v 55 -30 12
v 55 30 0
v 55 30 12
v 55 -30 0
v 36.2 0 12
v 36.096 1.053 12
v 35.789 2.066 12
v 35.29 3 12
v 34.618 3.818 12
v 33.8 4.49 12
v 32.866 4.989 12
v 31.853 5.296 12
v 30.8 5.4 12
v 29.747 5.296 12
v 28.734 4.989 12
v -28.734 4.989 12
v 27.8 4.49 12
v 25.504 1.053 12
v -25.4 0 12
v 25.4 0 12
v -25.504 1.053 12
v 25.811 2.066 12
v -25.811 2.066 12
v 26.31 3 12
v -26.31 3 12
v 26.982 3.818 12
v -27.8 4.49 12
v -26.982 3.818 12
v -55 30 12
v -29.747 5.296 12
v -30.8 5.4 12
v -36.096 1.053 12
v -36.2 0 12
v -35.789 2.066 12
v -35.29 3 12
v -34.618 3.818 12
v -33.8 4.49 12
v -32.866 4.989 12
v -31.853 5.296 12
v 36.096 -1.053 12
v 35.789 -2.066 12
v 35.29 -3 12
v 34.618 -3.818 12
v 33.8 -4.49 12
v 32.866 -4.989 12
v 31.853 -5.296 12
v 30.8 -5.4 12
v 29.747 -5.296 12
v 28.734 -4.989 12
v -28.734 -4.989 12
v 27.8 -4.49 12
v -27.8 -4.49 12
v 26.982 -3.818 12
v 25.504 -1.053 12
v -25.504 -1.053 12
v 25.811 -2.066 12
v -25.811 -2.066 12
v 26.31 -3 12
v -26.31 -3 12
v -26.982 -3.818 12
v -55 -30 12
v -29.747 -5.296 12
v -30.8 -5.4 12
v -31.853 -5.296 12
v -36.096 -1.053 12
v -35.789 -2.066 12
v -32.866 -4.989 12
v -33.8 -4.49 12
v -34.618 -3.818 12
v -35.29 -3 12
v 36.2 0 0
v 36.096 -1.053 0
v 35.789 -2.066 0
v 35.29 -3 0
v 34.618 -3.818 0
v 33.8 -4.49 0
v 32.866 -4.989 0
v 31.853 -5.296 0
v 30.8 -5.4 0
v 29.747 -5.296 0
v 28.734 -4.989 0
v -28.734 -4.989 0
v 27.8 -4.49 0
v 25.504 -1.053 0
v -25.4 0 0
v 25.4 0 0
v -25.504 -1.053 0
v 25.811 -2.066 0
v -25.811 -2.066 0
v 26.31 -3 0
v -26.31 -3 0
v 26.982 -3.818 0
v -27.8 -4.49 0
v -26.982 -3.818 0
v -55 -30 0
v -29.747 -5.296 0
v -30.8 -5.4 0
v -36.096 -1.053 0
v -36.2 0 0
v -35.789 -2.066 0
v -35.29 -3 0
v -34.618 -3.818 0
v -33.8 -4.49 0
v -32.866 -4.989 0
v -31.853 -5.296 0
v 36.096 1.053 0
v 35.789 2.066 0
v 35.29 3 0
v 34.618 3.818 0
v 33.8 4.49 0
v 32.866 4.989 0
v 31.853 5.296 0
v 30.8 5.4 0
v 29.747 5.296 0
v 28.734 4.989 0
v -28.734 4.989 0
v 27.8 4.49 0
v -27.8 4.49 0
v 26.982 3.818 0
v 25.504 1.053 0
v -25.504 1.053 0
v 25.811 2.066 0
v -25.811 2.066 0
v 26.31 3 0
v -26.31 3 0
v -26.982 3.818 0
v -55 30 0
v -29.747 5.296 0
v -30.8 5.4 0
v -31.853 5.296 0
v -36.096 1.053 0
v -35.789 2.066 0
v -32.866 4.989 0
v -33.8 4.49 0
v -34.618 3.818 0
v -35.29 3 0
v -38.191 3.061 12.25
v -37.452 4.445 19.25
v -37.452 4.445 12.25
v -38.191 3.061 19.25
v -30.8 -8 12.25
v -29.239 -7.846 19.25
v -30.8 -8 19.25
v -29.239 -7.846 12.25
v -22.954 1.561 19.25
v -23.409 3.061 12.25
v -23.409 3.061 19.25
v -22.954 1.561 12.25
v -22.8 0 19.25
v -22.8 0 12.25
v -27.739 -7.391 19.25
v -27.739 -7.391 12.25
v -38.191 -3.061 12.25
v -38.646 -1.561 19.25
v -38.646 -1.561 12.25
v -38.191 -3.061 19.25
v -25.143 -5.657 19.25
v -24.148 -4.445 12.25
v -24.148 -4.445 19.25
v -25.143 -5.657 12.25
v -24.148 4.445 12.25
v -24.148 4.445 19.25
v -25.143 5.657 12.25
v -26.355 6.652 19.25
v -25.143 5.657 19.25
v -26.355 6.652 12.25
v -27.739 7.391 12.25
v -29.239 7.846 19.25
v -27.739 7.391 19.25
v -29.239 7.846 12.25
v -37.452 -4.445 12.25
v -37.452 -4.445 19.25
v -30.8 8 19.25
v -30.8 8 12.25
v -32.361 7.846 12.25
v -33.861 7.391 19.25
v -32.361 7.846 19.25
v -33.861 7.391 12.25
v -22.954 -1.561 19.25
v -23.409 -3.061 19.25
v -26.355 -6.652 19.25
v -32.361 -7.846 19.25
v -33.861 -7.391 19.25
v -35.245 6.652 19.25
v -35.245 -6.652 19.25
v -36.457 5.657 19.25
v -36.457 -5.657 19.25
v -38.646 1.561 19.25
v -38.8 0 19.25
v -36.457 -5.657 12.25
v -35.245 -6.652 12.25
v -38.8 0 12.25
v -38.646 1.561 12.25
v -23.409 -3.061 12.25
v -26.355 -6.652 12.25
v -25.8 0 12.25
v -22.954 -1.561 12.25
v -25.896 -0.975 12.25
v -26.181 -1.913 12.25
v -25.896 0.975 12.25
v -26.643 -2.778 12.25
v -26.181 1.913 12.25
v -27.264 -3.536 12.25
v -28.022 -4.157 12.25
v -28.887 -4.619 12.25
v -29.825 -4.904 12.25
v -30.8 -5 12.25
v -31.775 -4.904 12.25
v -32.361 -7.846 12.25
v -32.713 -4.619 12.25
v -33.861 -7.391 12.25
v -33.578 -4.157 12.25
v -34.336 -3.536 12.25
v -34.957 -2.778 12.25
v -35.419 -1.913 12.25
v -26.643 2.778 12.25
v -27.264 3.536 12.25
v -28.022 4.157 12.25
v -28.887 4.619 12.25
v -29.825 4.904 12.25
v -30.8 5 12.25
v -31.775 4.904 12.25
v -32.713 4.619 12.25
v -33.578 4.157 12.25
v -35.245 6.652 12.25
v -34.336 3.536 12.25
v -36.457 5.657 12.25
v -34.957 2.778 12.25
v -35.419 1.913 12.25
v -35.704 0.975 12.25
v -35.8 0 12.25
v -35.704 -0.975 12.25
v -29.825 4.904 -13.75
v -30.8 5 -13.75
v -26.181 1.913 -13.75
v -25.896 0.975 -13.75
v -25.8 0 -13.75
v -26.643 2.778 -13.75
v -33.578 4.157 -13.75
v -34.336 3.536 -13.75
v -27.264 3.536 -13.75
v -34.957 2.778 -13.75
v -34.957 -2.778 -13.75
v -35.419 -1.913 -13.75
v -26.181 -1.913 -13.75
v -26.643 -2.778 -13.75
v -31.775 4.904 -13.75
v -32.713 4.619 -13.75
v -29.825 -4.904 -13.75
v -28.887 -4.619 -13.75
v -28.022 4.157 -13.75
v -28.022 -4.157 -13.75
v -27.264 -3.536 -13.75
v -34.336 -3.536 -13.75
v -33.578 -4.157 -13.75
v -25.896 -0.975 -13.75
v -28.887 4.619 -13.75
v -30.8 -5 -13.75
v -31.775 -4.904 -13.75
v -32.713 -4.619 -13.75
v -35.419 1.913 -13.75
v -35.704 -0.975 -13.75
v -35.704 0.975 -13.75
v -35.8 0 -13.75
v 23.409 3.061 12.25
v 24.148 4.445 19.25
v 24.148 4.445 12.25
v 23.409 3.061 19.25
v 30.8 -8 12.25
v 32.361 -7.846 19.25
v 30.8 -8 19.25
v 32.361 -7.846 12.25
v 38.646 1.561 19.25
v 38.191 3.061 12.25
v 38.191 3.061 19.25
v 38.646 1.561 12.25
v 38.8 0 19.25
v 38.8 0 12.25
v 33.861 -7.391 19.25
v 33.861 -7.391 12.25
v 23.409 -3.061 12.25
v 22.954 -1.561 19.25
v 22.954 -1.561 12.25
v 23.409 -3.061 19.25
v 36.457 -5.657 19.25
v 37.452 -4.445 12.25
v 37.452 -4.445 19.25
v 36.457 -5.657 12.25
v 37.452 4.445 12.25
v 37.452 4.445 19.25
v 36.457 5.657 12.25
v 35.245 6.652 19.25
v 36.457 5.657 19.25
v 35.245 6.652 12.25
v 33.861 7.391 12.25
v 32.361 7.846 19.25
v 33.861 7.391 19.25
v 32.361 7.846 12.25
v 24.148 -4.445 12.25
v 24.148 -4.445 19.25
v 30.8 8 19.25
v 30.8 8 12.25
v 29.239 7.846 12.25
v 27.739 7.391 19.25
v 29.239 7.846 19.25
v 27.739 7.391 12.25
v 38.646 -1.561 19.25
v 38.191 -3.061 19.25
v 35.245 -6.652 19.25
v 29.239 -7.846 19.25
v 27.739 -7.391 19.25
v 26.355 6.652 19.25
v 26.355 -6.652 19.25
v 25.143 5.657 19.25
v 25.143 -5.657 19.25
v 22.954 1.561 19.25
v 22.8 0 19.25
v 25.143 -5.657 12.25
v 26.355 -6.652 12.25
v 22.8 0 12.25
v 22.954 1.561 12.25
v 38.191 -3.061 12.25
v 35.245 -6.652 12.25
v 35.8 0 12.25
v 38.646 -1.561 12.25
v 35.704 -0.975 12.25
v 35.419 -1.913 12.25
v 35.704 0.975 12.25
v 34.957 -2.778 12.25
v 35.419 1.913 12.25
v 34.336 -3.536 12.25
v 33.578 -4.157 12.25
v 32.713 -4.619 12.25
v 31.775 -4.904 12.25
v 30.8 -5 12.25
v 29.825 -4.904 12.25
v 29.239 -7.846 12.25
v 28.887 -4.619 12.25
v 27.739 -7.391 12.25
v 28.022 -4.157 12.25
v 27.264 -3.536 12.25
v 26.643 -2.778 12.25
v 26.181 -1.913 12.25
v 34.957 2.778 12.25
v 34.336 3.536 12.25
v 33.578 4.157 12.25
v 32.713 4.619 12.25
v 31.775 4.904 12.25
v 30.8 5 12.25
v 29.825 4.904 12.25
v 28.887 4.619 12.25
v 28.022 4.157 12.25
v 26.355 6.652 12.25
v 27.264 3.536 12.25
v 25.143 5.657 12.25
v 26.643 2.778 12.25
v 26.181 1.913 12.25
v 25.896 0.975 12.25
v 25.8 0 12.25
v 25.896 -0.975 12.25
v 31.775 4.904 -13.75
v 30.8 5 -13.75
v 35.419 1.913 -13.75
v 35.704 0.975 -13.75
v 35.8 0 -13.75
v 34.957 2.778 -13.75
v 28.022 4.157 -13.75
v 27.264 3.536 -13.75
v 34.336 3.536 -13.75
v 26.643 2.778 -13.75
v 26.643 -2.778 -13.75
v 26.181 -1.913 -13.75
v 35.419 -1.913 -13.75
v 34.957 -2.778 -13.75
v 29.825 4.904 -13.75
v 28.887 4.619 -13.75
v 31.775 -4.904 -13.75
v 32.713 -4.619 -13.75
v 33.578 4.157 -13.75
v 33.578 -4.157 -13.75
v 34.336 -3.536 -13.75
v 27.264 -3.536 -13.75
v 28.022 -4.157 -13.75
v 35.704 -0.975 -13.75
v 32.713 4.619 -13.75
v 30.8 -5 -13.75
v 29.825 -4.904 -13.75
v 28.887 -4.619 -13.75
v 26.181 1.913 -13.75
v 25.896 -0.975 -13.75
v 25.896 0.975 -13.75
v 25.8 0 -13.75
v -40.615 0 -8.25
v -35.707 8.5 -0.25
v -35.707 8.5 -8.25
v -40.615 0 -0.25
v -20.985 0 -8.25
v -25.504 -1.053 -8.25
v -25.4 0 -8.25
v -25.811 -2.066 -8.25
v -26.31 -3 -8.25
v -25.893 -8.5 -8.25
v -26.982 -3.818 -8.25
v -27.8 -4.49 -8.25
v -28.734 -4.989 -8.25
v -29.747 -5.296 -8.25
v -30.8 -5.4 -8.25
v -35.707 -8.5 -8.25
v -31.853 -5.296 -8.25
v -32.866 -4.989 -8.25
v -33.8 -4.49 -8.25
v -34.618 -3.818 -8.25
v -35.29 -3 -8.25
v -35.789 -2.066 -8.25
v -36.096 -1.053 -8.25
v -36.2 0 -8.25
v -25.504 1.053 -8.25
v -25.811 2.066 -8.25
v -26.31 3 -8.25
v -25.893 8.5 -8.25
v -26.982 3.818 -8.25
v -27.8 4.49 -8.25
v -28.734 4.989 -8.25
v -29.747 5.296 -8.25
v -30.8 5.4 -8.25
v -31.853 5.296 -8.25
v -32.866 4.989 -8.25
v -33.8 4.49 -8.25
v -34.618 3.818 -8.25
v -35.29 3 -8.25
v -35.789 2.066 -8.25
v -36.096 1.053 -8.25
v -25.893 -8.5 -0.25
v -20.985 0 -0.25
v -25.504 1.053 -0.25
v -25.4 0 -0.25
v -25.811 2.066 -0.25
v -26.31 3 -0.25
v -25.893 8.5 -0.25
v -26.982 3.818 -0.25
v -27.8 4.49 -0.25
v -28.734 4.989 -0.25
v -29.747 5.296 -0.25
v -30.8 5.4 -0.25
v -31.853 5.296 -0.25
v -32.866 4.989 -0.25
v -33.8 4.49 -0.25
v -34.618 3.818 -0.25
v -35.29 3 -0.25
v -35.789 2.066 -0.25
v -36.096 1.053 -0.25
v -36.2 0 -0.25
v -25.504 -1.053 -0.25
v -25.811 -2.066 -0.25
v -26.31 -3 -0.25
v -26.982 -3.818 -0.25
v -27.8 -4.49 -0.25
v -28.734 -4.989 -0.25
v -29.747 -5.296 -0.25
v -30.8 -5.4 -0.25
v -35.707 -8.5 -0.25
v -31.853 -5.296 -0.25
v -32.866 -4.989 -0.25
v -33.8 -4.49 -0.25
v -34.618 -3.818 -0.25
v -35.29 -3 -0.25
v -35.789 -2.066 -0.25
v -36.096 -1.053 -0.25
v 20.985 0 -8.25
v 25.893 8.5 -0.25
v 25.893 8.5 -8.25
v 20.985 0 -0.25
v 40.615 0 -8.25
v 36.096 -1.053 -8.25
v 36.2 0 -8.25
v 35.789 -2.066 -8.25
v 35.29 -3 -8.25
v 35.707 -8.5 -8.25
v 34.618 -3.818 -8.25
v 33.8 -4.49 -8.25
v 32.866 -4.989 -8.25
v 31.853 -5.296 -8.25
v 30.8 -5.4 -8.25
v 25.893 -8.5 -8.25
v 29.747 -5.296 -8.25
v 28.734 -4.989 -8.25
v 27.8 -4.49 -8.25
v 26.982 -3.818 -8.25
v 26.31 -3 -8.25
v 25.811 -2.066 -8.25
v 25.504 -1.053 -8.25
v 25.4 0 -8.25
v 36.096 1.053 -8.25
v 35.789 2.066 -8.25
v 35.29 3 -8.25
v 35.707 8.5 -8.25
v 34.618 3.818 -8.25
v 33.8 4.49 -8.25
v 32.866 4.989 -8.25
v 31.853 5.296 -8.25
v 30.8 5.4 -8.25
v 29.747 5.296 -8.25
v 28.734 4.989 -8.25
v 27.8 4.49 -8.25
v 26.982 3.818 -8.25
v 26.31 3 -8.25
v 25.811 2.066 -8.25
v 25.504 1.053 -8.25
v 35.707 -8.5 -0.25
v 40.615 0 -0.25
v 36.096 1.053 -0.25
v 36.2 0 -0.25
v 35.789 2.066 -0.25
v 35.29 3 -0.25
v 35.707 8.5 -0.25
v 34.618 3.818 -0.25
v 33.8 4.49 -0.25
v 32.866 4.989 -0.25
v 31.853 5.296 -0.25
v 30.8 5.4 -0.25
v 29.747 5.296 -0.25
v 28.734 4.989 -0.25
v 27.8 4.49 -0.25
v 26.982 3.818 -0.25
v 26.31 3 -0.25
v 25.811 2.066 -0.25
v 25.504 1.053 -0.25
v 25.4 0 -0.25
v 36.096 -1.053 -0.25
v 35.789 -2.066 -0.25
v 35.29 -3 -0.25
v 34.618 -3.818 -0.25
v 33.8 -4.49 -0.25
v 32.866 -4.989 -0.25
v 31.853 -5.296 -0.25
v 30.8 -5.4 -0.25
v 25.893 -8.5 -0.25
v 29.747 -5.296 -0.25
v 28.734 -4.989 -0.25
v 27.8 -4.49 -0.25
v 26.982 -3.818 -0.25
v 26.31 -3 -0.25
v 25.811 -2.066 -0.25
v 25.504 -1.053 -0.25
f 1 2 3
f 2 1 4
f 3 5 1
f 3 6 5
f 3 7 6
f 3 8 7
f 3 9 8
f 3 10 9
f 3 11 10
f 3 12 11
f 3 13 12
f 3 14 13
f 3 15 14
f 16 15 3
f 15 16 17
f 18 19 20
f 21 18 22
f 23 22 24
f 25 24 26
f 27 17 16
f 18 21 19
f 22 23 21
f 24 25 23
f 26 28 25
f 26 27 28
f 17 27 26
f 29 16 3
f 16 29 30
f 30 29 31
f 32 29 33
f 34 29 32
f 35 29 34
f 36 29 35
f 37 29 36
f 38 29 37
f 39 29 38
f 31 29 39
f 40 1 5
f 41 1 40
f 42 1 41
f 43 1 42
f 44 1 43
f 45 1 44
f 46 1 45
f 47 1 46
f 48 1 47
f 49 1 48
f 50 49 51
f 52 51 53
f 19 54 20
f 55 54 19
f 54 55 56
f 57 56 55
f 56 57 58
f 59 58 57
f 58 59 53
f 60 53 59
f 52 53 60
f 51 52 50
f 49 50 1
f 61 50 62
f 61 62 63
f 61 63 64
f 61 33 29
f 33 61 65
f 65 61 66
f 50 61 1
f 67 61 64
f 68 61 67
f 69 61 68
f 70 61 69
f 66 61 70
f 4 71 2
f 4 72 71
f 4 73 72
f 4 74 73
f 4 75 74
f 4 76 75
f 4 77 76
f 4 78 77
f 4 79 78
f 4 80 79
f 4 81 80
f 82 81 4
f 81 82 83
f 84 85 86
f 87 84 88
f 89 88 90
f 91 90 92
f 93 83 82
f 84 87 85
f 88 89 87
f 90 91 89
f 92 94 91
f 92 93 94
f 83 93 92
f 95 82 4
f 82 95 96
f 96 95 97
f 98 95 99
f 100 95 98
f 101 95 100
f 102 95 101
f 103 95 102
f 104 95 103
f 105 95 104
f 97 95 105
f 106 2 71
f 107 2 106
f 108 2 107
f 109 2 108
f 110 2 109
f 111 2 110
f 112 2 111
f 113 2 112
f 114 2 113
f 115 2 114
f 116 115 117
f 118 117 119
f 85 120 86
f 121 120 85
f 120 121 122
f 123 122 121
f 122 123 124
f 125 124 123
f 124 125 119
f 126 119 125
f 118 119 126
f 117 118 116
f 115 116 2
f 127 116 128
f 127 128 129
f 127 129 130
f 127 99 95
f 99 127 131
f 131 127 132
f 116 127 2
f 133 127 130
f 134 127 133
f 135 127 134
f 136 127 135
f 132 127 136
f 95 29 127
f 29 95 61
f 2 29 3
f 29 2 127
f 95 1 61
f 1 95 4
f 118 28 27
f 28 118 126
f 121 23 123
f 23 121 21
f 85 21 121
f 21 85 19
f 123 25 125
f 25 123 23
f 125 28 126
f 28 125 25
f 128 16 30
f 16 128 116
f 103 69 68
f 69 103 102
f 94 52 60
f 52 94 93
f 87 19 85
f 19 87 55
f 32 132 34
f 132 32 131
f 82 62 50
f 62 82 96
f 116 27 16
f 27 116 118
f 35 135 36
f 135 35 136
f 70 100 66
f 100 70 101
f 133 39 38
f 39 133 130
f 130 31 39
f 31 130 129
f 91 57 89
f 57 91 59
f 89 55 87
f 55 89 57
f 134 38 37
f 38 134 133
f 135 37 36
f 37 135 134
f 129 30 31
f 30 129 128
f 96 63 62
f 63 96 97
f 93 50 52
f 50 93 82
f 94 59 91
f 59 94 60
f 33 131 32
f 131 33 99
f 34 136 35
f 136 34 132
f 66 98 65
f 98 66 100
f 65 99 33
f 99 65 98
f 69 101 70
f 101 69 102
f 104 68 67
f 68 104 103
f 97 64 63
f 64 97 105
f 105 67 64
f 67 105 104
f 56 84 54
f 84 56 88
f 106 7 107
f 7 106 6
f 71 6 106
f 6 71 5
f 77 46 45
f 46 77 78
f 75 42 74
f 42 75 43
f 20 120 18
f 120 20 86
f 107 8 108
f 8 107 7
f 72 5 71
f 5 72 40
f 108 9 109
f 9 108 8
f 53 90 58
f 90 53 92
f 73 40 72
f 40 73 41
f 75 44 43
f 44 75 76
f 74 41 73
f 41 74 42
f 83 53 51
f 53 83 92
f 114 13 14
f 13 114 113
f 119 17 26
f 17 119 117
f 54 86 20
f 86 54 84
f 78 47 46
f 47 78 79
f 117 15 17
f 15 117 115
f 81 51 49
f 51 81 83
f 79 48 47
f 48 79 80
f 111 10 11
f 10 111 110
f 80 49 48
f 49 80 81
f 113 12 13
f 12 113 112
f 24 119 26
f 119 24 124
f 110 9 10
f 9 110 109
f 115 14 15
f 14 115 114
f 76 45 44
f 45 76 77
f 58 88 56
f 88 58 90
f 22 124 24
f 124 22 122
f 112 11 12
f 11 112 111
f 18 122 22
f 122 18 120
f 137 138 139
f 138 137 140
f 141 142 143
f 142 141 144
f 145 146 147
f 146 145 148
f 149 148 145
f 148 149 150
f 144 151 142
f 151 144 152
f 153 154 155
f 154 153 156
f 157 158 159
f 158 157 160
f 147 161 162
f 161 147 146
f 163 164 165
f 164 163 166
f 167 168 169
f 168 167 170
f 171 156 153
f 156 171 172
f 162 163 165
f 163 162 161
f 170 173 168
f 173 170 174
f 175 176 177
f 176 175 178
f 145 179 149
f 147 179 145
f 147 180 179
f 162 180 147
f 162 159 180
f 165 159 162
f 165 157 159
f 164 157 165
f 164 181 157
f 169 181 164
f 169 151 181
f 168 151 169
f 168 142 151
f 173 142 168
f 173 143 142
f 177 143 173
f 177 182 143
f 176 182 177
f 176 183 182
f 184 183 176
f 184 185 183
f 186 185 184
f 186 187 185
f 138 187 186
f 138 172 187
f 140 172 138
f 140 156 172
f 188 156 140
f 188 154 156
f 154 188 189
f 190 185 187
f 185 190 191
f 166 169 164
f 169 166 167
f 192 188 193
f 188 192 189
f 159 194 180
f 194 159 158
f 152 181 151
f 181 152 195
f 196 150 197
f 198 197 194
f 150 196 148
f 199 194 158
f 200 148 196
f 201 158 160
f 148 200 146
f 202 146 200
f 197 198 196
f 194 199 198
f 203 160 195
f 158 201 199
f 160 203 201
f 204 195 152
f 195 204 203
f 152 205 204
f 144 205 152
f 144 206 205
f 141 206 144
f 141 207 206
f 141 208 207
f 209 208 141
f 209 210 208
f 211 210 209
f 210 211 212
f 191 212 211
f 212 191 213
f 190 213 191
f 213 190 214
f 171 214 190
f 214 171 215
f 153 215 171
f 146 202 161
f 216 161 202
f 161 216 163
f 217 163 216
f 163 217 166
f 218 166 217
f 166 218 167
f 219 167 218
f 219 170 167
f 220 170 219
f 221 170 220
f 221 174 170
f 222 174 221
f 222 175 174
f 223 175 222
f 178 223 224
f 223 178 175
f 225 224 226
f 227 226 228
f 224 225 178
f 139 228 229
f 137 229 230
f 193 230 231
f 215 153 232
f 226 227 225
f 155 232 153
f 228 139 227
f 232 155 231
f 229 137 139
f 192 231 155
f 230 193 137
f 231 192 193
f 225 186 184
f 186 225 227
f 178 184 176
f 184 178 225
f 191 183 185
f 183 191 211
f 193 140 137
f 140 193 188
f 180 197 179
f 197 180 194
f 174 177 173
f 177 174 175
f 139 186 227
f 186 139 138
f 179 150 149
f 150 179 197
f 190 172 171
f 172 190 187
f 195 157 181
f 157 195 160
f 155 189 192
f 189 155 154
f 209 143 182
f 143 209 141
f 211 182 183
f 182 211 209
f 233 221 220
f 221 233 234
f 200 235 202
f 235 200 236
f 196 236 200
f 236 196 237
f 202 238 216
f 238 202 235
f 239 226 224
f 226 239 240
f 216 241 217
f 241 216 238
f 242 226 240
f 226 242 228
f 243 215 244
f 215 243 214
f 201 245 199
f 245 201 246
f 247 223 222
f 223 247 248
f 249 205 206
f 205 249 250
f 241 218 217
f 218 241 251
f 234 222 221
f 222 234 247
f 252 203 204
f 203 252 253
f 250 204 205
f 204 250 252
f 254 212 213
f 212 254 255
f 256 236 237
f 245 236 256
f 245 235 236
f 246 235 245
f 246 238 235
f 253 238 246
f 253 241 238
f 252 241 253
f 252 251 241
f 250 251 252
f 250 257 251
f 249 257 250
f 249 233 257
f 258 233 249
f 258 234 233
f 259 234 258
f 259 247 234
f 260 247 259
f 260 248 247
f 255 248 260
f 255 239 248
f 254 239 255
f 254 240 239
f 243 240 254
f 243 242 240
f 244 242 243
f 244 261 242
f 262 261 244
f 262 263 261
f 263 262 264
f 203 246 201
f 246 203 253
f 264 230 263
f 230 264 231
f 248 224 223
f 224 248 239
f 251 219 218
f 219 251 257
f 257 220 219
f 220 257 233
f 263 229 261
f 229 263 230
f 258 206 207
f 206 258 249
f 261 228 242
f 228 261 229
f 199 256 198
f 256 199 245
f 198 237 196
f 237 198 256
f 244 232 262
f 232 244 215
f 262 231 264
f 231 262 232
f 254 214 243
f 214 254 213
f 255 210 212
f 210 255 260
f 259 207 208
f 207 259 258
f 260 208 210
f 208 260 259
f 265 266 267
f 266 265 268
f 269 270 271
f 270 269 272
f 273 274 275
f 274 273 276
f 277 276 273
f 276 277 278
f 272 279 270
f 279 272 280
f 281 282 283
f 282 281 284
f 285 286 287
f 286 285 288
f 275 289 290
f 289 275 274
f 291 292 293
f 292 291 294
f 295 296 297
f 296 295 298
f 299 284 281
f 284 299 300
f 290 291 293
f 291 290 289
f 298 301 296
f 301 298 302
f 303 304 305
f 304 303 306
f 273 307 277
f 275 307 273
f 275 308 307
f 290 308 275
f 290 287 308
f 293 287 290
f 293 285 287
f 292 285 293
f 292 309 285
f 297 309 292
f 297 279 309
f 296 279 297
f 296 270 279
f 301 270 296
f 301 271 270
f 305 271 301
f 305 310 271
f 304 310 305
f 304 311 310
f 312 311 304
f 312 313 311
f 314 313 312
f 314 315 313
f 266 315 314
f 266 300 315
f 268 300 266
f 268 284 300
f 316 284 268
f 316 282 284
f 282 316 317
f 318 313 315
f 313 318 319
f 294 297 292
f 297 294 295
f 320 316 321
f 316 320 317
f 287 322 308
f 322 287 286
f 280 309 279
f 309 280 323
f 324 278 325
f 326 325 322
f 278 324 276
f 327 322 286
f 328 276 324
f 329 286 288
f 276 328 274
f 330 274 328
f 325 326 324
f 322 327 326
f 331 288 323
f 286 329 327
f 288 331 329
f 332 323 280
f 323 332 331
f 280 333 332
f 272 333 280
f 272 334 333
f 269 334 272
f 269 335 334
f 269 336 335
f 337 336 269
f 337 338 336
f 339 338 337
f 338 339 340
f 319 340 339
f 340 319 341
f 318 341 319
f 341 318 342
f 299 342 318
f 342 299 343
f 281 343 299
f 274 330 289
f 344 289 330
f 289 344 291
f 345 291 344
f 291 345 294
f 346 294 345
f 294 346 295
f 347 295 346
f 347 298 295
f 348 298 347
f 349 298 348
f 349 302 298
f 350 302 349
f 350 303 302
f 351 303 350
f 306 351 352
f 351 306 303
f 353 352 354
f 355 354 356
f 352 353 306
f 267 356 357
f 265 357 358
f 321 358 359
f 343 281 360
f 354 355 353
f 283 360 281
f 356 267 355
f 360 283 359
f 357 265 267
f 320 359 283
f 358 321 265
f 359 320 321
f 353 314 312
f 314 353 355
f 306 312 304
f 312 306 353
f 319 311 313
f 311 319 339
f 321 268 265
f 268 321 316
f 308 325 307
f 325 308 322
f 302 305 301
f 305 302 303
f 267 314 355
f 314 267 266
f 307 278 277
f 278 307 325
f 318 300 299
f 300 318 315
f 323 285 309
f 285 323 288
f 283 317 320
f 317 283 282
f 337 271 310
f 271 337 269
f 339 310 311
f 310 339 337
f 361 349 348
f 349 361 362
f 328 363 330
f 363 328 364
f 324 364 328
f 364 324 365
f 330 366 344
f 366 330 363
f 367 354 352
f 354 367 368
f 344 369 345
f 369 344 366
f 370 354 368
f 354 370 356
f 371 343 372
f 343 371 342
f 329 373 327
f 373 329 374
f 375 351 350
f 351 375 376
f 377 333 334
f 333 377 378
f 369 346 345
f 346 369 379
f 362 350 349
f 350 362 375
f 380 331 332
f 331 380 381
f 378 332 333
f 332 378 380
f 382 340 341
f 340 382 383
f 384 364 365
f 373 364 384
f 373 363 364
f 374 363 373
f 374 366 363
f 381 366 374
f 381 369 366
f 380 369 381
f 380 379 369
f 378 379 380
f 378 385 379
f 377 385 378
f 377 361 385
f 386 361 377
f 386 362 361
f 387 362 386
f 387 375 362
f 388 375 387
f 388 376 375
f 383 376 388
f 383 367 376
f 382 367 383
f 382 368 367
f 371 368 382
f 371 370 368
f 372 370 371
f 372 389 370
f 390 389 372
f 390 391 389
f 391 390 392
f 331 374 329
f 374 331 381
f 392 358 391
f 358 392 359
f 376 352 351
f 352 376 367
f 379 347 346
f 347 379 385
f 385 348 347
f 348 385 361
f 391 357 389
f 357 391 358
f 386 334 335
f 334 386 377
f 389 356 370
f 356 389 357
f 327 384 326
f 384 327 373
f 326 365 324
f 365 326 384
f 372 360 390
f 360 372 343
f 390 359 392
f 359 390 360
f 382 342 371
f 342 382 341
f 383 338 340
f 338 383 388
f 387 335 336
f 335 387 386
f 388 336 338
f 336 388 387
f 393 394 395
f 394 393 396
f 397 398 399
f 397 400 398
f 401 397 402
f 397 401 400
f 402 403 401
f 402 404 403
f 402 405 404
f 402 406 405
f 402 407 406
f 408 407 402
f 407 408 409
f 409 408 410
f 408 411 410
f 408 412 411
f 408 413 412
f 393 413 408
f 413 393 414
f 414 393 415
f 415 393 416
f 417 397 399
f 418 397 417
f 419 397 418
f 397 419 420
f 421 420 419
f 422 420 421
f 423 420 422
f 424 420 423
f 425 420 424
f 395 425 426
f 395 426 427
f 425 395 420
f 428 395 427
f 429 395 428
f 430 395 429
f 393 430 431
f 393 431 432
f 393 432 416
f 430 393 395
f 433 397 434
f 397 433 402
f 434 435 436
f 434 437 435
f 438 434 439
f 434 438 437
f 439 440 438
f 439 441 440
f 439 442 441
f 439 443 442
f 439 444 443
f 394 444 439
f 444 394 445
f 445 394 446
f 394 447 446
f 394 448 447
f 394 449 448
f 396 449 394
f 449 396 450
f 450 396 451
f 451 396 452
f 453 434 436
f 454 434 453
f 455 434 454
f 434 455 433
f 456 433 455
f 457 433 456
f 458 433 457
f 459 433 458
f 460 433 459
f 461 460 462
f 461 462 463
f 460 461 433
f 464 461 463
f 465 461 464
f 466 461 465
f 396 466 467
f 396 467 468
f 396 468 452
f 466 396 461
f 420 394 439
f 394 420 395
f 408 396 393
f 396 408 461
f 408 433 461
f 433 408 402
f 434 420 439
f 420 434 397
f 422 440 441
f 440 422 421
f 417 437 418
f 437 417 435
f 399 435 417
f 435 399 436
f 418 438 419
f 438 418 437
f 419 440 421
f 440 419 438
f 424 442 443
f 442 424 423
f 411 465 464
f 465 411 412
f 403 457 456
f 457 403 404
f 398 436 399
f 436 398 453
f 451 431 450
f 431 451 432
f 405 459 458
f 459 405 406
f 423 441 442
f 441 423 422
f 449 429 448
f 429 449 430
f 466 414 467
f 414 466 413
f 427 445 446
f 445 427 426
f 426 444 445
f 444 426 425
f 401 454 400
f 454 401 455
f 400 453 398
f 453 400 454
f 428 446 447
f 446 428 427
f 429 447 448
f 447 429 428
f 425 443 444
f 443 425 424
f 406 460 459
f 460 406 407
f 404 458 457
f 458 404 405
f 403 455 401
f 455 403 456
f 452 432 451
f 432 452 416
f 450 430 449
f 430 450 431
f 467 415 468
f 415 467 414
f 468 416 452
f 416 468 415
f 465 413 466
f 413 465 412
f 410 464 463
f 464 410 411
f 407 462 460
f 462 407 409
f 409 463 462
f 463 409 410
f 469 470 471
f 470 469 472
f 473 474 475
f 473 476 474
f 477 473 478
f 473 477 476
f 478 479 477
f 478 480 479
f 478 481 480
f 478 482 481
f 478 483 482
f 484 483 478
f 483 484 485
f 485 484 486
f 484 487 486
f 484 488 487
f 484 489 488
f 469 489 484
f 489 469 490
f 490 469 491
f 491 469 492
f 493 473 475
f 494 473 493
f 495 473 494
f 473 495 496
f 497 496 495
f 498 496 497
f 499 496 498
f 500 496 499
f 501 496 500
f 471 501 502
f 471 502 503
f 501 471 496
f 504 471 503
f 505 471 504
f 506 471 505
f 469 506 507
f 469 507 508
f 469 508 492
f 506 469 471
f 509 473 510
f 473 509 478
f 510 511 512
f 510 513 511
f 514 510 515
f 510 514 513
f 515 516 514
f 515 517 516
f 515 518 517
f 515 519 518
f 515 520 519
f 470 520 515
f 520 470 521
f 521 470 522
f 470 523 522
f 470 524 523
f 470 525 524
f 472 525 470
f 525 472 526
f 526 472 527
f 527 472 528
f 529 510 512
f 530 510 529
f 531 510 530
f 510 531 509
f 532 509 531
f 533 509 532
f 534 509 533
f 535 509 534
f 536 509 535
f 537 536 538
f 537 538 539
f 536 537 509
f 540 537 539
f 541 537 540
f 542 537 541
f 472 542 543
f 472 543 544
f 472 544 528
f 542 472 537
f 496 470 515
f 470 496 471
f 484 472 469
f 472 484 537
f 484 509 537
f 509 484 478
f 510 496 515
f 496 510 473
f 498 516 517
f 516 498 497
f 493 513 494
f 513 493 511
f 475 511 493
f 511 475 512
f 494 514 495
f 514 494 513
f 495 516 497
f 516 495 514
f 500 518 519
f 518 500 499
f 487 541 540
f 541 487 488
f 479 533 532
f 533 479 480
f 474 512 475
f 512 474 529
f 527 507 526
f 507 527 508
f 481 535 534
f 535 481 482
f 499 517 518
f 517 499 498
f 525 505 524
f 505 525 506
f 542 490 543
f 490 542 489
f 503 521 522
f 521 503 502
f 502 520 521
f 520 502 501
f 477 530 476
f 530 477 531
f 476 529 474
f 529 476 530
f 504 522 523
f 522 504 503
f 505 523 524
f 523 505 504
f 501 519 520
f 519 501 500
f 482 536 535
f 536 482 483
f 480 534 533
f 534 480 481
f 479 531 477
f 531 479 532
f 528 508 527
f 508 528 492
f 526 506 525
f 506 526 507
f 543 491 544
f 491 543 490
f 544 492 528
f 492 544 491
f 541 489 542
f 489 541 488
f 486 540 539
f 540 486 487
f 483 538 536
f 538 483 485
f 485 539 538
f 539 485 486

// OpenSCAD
$fn = 32;

// ------------------------------------------------------------------------
// Bolted plate: 110 x 60 x 12 mm plate, 2 fasteners
// Every part is its own module, assembly() places them once.
// ------------------------------------------------------------------------

// --- part 1 ---
module plate() {
  difference() {
    translate([-55, -30, 0]) cube([110, 60, 12]);
    translate([-30.8, 0, -1]) cylinder(h = 14, d = 10.8);
    translate([30.8, 0, -1]) cylinder(h = 14, d = 10.8);
  }
}

// --- part 2 ---
module bolt1() {
  cylinder(h = 7, d = 16);
  translate([0, 0, -26]) cylinder(h = 26, d = 10);
}

// --- part 3 ---
module bolt2() {
  cylinder(h = 7, d = 16);
  translate([0, 0, -26]) cylinder(h = 26, d = 10);
}

// --- part 4 ---
module nut1() {
  difference() {
    linear_extrude(height = 8) polygon(points = [[9.815, 0], [4.907, 8.5], [-4.907, 8.5], [-9.815, 0], [-4.907, -8.5], [4.907, -8.5]]);
    translate([0, 0, -1]) cylinder(h = 10, d = 10.8);
  }
}

// --- part 5 ---
module nut2() {
  difference() {
    linear_extrude(height = 8) polygon(points = [[9.815, 0], [4.907, 8.5], [-4.907, 8.5], [-9.815, 0], [-4.907, -8.5], [4.907, -8.5]]);
    translate([0, 0, -1]) cylinder(h = 10, d = 10.8);
  }
}

// --- assembly ---
module assembly() {
  translate([0, 0, 0]) rotate([0, 0, 0]) plate();
  translate([-30.8, 0, 12.25]) rotate([0, 0, 0]) bolt1();
  translate([30.8, 0, 12.25]) rotate([0, 0, 0]) bolt2();
  translate([-30.8, 0, -8.25]) rotate([0, 0, 0]) nut1();
  translate([30.8, 0, -8.25]) rotate([0, 0, 0]) nut2();
}

assembly();
